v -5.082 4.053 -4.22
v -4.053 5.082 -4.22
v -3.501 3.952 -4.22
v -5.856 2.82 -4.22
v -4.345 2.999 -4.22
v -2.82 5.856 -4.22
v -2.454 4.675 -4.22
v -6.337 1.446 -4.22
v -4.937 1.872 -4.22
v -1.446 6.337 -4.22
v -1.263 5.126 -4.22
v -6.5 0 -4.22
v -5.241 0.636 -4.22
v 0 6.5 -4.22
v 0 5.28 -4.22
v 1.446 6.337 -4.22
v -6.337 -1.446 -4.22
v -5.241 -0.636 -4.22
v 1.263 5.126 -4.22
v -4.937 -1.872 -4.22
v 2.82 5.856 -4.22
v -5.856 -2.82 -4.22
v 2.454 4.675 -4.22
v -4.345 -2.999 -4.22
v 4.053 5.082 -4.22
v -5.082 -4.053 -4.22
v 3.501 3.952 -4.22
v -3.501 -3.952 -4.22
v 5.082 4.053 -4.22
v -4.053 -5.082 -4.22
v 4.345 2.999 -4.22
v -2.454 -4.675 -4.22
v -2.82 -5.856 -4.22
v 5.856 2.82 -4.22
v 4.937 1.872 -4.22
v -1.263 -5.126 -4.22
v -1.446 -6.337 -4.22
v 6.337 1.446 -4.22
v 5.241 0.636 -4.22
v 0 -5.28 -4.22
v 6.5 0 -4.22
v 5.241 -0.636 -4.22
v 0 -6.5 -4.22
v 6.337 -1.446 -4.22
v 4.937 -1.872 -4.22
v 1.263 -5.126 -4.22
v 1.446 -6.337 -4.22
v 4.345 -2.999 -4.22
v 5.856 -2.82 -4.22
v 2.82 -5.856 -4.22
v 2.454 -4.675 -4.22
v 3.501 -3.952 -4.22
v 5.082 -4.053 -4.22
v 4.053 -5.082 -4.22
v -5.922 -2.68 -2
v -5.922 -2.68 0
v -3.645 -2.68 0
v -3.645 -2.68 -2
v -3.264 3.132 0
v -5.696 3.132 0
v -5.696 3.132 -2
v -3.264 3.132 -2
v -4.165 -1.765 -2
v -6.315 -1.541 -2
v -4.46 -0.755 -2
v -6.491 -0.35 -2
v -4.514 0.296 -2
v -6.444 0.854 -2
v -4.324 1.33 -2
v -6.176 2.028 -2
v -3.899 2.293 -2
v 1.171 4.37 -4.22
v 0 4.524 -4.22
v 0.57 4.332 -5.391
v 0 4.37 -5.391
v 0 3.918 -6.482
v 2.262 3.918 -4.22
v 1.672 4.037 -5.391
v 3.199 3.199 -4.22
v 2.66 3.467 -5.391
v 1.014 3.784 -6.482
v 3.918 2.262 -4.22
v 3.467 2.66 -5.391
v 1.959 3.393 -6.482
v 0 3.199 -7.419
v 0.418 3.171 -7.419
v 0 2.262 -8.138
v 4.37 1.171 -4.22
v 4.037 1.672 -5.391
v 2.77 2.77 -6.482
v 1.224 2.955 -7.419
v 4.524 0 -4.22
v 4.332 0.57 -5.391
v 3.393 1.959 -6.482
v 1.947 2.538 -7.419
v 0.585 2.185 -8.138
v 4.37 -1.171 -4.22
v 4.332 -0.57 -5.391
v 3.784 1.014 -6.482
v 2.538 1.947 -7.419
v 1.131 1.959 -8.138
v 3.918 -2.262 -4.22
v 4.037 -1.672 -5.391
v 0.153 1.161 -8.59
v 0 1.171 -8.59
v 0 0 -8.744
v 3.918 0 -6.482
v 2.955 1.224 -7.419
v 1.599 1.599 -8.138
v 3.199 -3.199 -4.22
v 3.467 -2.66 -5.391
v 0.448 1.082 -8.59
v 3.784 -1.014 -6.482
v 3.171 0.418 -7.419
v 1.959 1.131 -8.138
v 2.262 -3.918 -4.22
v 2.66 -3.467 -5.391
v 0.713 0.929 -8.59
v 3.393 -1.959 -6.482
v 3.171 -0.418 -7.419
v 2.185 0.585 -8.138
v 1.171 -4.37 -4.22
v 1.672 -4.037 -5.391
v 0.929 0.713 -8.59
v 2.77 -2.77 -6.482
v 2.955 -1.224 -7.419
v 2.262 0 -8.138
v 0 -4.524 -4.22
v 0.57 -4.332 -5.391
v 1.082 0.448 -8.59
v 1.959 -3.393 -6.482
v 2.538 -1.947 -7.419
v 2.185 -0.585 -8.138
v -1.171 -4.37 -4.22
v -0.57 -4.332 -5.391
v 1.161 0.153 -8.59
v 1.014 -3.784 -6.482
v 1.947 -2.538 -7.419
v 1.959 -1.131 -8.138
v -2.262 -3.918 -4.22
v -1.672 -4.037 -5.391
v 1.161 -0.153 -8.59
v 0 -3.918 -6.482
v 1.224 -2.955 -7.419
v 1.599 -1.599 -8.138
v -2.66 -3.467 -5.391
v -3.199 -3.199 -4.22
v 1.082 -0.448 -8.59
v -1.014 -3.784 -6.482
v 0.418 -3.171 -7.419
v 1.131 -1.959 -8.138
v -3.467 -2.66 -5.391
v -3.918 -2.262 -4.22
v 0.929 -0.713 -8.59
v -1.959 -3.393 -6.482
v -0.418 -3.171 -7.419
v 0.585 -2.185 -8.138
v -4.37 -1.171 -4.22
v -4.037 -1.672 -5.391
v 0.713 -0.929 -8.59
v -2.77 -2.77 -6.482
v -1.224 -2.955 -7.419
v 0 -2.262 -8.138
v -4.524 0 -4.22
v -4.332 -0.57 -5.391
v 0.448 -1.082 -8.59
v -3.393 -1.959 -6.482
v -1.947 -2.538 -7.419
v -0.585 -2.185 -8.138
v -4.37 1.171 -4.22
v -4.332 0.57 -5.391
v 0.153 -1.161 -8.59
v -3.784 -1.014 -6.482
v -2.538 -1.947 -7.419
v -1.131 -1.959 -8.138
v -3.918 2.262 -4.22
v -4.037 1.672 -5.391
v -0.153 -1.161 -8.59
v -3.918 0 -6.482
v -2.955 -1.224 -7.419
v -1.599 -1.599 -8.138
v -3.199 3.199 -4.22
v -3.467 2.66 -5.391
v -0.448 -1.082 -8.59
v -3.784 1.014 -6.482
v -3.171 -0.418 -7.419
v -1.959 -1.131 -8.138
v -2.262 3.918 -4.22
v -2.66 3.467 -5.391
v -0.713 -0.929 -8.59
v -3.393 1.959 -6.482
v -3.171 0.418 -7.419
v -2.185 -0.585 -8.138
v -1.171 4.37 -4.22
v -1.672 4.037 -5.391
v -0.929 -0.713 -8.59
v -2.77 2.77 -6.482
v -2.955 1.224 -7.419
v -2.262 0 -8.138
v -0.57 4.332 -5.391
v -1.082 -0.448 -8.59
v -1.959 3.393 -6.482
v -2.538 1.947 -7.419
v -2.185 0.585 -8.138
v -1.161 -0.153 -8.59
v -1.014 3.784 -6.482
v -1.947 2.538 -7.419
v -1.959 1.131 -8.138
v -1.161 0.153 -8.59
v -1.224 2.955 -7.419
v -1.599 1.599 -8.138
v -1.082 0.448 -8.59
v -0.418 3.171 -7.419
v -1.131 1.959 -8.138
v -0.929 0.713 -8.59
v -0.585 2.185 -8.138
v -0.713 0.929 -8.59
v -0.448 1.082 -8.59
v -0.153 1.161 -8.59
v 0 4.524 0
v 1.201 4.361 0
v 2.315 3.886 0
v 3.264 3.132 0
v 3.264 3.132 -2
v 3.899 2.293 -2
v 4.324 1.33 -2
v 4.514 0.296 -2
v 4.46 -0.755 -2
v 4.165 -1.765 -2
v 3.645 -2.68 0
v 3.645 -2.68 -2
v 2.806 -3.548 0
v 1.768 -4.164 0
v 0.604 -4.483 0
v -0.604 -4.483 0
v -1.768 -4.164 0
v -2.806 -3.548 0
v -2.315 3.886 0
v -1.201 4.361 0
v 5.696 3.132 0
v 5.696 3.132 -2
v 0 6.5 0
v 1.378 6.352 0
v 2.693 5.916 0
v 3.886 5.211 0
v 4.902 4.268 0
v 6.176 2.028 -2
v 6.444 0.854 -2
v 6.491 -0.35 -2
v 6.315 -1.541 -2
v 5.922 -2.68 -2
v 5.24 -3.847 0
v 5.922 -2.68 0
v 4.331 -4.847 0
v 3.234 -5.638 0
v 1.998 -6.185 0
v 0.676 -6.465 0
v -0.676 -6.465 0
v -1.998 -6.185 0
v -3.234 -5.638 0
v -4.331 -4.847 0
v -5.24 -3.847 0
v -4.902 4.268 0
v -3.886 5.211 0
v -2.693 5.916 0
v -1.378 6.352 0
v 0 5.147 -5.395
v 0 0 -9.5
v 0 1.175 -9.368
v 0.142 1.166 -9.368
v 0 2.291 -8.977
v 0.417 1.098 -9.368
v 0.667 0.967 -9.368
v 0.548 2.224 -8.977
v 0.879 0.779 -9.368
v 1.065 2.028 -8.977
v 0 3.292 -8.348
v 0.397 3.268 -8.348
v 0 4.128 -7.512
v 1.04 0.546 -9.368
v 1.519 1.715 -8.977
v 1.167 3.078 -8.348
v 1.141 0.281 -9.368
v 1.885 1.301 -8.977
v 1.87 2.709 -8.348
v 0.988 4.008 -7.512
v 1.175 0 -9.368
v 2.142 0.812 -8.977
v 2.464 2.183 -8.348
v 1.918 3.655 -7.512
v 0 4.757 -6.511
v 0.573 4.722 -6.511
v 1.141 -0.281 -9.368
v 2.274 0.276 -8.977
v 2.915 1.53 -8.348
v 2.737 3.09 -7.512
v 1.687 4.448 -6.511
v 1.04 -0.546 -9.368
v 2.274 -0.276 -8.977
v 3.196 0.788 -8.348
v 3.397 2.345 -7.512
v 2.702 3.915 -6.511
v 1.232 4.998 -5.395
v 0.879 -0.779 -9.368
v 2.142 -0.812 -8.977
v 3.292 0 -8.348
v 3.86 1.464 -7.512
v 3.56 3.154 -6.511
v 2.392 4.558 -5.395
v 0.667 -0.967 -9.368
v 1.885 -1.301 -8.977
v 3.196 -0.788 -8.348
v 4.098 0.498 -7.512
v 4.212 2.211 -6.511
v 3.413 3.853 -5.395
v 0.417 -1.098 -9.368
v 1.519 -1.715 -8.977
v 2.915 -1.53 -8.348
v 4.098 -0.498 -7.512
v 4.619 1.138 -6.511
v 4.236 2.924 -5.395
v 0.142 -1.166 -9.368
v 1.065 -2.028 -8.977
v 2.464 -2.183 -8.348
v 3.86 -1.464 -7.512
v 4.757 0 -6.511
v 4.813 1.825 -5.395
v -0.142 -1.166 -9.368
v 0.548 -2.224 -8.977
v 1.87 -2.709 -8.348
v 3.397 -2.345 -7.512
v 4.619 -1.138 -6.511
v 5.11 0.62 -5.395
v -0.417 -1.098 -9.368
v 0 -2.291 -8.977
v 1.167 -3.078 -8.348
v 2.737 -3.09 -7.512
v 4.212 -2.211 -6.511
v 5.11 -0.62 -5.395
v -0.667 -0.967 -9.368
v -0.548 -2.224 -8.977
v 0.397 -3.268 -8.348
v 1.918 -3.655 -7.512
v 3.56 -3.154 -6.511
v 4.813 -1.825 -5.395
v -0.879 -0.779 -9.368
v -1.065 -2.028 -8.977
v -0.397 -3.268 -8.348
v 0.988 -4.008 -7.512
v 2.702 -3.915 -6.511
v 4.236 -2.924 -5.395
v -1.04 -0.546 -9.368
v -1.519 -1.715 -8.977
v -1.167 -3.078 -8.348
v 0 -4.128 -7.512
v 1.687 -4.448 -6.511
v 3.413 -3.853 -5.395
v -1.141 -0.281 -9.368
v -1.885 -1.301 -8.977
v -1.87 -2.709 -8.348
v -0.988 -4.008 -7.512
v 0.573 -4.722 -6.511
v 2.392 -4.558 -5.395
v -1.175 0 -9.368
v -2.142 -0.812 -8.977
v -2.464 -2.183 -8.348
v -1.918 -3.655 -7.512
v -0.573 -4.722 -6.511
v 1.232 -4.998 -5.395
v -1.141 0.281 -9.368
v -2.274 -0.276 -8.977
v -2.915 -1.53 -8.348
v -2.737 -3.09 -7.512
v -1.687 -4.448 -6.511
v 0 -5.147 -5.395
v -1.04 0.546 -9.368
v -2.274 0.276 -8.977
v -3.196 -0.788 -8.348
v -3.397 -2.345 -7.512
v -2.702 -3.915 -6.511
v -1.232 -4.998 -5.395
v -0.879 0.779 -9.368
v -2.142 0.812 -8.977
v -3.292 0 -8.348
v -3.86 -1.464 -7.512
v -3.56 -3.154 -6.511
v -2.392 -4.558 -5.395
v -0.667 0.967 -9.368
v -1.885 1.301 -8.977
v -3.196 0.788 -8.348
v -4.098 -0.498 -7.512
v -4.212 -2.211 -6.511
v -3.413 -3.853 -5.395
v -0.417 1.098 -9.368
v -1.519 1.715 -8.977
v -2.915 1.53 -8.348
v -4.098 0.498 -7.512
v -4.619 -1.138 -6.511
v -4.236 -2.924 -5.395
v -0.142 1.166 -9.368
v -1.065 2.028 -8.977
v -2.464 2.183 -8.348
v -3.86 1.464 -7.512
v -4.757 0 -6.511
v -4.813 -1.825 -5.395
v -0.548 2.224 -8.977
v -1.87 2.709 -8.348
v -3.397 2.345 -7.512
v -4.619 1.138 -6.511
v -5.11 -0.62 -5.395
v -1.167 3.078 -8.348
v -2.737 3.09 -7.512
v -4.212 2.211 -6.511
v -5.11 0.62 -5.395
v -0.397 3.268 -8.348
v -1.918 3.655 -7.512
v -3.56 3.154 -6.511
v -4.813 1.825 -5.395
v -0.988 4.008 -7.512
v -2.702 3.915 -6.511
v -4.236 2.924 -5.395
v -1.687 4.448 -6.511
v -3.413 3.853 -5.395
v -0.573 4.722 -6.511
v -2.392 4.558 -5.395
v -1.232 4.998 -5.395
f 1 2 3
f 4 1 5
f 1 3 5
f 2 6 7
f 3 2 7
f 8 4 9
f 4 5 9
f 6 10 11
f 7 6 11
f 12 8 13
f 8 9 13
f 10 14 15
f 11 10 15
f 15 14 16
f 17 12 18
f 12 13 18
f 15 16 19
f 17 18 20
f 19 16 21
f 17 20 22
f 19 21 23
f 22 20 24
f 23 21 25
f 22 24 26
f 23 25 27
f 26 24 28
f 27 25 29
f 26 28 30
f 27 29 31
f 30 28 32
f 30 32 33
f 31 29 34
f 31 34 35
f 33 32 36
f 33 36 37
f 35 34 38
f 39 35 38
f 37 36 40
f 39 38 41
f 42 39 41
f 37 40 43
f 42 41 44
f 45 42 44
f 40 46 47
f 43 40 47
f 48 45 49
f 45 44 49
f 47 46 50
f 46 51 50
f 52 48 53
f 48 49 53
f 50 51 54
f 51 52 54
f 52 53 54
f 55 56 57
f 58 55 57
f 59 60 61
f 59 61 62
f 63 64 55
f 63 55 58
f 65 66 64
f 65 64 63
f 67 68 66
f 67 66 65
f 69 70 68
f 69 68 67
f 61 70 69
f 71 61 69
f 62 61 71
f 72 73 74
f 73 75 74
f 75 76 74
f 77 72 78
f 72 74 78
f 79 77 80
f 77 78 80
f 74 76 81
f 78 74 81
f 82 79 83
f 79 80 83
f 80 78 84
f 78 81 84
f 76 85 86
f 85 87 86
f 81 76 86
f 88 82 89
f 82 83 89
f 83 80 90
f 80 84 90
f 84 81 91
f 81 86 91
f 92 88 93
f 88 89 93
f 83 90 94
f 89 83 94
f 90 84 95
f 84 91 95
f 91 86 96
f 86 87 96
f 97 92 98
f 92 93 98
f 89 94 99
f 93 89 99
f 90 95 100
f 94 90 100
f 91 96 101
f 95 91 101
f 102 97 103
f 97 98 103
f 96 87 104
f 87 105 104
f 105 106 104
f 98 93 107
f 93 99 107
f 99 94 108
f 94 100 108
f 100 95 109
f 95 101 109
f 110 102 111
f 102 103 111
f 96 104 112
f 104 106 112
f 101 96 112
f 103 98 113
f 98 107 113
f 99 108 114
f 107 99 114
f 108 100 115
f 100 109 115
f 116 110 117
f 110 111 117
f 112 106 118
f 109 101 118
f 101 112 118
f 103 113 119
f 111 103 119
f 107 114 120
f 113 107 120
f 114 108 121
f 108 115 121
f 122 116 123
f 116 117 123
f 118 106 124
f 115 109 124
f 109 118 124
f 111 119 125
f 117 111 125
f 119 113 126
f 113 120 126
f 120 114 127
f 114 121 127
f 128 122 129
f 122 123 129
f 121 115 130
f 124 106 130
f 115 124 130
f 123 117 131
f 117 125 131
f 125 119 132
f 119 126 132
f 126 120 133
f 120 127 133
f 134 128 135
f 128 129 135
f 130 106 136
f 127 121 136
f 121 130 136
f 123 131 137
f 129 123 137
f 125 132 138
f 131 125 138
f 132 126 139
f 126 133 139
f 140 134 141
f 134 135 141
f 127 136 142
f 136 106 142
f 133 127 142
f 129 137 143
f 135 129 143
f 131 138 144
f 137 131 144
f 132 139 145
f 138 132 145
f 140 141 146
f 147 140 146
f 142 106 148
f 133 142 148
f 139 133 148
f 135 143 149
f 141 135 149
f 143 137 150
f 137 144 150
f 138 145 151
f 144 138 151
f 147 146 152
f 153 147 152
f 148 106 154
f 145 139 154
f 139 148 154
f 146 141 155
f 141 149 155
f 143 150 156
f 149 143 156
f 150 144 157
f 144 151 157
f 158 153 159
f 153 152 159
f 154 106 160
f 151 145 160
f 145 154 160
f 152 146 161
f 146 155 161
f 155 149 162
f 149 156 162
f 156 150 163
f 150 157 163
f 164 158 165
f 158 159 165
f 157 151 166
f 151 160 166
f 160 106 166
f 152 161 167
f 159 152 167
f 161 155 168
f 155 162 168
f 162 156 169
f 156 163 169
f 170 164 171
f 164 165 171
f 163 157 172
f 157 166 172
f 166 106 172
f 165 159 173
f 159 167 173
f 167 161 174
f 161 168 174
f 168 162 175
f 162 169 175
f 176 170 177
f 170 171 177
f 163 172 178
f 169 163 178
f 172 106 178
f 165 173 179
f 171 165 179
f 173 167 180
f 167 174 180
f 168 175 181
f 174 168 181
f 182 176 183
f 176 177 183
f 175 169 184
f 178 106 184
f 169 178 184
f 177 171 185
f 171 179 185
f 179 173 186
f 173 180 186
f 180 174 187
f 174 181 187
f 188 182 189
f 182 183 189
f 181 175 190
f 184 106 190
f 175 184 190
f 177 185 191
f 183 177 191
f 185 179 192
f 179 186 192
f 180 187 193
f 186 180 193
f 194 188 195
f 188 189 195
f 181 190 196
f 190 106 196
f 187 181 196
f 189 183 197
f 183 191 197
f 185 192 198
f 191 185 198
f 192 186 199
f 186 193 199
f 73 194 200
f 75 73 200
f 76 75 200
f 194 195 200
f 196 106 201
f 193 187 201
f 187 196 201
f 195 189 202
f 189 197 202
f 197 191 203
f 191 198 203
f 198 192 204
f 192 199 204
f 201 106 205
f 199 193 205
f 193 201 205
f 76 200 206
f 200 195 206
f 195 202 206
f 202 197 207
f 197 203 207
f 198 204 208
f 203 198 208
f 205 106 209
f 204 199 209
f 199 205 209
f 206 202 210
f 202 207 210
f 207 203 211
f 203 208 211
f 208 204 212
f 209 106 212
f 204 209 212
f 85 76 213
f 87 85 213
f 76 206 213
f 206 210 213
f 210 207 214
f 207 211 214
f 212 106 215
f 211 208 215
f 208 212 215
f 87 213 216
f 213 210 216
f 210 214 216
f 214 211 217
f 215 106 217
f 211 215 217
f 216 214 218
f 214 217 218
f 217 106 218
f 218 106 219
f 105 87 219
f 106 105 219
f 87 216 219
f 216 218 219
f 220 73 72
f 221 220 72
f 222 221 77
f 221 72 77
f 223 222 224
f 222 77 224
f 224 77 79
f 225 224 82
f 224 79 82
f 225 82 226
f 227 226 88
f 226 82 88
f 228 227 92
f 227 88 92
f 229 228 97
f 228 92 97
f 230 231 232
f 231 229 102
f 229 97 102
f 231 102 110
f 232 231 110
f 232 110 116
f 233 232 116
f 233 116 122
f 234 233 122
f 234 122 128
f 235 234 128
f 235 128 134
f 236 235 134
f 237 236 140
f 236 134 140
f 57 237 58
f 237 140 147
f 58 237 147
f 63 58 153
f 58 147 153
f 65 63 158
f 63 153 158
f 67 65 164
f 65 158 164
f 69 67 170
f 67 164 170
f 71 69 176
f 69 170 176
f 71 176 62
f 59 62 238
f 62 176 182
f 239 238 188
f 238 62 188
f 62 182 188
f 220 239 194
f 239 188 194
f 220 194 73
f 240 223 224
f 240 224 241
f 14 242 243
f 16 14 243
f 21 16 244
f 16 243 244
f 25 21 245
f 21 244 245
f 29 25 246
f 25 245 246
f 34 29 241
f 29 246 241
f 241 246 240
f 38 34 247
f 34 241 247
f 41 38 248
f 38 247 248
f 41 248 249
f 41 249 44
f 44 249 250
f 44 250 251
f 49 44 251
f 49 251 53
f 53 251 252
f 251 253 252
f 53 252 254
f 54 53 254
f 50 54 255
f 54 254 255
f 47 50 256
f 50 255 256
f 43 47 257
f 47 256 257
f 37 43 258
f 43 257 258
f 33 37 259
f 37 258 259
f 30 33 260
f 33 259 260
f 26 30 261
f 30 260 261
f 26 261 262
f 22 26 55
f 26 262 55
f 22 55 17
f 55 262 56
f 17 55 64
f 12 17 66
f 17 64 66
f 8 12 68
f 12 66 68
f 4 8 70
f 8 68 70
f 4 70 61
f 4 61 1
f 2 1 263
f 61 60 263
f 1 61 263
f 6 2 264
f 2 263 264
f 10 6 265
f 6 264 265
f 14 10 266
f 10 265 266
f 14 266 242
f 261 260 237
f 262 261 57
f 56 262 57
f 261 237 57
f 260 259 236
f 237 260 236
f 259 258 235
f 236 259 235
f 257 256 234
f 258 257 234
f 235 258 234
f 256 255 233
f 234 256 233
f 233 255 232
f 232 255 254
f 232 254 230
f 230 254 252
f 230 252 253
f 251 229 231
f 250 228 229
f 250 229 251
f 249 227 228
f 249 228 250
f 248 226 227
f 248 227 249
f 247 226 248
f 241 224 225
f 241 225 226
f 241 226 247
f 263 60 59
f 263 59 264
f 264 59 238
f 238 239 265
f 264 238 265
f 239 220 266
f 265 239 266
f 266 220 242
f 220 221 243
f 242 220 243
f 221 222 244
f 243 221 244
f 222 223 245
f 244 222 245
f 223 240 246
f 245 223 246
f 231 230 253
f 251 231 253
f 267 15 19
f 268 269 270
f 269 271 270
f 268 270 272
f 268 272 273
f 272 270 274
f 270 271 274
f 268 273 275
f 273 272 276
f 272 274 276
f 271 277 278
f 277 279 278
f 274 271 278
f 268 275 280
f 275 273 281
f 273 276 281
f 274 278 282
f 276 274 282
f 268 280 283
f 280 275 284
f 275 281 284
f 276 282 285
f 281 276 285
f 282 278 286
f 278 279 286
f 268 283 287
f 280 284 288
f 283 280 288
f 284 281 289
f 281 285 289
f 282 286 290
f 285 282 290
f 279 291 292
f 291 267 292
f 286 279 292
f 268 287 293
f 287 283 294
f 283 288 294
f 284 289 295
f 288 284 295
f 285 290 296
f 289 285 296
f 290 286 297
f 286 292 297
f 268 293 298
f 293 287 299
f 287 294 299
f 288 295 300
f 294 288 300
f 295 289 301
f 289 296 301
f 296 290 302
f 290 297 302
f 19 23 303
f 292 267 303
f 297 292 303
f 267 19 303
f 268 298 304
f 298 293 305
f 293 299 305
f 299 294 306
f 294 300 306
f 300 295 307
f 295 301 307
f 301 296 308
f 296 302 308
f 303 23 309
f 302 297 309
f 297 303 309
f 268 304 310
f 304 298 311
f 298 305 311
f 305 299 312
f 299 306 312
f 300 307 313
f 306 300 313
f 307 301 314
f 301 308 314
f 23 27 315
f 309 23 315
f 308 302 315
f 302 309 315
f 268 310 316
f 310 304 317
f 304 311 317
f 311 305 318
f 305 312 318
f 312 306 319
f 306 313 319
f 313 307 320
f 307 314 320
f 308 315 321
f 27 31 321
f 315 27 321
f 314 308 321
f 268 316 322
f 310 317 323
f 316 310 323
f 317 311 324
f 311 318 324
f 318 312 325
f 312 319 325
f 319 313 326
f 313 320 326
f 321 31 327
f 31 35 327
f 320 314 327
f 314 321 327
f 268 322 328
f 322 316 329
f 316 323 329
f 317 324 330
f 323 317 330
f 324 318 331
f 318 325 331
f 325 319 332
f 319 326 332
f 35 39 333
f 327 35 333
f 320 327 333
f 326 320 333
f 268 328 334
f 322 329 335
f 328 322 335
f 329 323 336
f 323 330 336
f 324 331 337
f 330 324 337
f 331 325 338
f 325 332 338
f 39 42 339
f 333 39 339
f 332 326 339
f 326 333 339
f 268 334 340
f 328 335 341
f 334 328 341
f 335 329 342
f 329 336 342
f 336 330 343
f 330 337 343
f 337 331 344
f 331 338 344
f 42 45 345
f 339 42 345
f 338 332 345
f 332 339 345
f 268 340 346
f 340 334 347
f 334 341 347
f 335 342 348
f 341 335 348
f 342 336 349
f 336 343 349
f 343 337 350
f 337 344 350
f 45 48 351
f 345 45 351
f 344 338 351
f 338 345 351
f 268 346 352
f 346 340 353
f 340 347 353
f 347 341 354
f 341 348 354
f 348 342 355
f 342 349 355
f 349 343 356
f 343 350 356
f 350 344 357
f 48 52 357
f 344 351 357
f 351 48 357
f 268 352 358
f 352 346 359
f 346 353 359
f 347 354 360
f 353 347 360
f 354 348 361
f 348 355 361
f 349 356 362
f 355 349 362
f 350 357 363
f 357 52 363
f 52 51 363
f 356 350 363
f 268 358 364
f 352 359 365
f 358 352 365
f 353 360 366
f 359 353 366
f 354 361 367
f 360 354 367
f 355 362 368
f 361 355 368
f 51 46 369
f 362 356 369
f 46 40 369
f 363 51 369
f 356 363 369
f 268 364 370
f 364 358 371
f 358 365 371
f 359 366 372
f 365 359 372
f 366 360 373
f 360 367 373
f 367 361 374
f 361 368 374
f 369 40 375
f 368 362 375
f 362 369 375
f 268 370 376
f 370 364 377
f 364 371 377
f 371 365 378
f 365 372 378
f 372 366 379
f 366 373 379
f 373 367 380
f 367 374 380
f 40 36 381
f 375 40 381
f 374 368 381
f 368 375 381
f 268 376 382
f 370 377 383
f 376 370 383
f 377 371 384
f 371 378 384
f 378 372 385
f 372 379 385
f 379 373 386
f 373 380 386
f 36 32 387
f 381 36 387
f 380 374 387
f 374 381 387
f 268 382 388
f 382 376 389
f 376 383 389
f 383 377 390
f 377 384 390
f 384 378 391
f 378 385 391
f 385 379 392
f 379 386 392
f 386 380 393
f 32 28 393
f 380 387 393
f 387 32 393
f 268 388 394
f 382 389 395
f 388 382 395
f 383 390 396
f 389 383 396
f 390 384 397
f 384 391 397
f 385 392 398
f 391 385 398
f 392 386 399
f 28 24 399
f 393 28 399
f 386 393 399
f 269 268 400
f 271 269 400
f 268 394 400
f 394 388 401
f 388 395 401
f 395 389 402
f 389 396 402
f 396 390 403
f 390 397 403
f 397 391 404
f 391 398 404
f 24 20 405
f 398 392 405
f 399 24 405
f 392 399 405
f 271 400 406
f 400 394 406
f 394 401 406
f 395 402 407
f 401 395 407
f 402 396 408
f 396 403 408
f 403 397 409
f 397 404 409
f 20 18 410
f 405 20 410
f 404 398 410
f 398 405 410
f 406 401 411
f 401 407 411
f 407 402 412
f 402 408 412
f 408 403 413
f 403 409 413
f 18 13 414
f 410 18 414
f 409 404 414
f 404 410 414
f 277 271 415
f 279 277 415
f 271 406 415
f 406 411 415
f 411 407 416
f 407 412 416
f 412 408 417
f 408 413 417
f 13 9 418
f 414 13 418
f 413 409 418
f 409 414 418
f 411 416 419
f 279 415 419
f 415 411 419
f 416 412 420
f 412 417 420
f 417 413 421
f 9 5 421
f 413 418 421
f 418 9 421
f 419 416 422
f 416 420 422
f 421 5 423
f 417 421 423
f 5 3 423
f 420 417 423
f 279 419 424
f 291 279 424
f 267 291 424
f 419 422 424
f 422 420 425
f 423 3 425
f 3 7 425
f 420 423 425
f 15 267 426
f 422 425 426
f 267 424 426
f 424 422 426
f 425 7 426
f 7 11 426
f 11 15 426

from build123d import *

# Parameters (mm, degrees)
ESBO_O2_W             = 15.991560494
ESBO_O2_H             = 5.81194908
CORTE_EXTRUS_O1_DEPTH = 2


with BuildPart() as part:
    # Esboço1 → Revolução1 (revolve)
    with BuildSketch(Plane(origin=(0, 0, 0), x_dir=(0, 0, -1), z_dir=(1, 0, 0))):
        with BuildLine():
            Line((4.220409826, 6.5), (0, 6.5))
            Line((0, 6.5), (0, 5.93167583))
            Line((0, 5.93167583), (0, 4.523660393))
            Line((0, 4.523660393), (3.444296294, 4.523660393))
            Line((3.444296294, 4.523660393), (4.220409826, 4.523660393))
            ThreePointArc((4.220409826, 4.523660393), (7.419120765, 3.198710939), (8.744070218, 0))
            Line((8.744070218, 0), (9.5, 0))
            ThreePointArc((9.5, 0), (7.95364384, 3.733234014), (4.220409826, 5.279590174))
            Line((4.220409826, 5.279590174), (4.220409826, 6.5))
        make_face()
    revolve(axis=Axis((0, 0, 0), (0, 0, -1)))

    # Esboço2 → Corte-extrusão1 (cut)
    with BuildSketch(Plane.XY):
        with Locations((0.060903658, 0.226213587)):
            Rectangle(ESBO_O2_W, ESBO_O2_H)
    extrude(amount=-CORTE_EXTRUS_O1_DEPTH, mode=Mode.SUBTRACT)


solid = part.part
